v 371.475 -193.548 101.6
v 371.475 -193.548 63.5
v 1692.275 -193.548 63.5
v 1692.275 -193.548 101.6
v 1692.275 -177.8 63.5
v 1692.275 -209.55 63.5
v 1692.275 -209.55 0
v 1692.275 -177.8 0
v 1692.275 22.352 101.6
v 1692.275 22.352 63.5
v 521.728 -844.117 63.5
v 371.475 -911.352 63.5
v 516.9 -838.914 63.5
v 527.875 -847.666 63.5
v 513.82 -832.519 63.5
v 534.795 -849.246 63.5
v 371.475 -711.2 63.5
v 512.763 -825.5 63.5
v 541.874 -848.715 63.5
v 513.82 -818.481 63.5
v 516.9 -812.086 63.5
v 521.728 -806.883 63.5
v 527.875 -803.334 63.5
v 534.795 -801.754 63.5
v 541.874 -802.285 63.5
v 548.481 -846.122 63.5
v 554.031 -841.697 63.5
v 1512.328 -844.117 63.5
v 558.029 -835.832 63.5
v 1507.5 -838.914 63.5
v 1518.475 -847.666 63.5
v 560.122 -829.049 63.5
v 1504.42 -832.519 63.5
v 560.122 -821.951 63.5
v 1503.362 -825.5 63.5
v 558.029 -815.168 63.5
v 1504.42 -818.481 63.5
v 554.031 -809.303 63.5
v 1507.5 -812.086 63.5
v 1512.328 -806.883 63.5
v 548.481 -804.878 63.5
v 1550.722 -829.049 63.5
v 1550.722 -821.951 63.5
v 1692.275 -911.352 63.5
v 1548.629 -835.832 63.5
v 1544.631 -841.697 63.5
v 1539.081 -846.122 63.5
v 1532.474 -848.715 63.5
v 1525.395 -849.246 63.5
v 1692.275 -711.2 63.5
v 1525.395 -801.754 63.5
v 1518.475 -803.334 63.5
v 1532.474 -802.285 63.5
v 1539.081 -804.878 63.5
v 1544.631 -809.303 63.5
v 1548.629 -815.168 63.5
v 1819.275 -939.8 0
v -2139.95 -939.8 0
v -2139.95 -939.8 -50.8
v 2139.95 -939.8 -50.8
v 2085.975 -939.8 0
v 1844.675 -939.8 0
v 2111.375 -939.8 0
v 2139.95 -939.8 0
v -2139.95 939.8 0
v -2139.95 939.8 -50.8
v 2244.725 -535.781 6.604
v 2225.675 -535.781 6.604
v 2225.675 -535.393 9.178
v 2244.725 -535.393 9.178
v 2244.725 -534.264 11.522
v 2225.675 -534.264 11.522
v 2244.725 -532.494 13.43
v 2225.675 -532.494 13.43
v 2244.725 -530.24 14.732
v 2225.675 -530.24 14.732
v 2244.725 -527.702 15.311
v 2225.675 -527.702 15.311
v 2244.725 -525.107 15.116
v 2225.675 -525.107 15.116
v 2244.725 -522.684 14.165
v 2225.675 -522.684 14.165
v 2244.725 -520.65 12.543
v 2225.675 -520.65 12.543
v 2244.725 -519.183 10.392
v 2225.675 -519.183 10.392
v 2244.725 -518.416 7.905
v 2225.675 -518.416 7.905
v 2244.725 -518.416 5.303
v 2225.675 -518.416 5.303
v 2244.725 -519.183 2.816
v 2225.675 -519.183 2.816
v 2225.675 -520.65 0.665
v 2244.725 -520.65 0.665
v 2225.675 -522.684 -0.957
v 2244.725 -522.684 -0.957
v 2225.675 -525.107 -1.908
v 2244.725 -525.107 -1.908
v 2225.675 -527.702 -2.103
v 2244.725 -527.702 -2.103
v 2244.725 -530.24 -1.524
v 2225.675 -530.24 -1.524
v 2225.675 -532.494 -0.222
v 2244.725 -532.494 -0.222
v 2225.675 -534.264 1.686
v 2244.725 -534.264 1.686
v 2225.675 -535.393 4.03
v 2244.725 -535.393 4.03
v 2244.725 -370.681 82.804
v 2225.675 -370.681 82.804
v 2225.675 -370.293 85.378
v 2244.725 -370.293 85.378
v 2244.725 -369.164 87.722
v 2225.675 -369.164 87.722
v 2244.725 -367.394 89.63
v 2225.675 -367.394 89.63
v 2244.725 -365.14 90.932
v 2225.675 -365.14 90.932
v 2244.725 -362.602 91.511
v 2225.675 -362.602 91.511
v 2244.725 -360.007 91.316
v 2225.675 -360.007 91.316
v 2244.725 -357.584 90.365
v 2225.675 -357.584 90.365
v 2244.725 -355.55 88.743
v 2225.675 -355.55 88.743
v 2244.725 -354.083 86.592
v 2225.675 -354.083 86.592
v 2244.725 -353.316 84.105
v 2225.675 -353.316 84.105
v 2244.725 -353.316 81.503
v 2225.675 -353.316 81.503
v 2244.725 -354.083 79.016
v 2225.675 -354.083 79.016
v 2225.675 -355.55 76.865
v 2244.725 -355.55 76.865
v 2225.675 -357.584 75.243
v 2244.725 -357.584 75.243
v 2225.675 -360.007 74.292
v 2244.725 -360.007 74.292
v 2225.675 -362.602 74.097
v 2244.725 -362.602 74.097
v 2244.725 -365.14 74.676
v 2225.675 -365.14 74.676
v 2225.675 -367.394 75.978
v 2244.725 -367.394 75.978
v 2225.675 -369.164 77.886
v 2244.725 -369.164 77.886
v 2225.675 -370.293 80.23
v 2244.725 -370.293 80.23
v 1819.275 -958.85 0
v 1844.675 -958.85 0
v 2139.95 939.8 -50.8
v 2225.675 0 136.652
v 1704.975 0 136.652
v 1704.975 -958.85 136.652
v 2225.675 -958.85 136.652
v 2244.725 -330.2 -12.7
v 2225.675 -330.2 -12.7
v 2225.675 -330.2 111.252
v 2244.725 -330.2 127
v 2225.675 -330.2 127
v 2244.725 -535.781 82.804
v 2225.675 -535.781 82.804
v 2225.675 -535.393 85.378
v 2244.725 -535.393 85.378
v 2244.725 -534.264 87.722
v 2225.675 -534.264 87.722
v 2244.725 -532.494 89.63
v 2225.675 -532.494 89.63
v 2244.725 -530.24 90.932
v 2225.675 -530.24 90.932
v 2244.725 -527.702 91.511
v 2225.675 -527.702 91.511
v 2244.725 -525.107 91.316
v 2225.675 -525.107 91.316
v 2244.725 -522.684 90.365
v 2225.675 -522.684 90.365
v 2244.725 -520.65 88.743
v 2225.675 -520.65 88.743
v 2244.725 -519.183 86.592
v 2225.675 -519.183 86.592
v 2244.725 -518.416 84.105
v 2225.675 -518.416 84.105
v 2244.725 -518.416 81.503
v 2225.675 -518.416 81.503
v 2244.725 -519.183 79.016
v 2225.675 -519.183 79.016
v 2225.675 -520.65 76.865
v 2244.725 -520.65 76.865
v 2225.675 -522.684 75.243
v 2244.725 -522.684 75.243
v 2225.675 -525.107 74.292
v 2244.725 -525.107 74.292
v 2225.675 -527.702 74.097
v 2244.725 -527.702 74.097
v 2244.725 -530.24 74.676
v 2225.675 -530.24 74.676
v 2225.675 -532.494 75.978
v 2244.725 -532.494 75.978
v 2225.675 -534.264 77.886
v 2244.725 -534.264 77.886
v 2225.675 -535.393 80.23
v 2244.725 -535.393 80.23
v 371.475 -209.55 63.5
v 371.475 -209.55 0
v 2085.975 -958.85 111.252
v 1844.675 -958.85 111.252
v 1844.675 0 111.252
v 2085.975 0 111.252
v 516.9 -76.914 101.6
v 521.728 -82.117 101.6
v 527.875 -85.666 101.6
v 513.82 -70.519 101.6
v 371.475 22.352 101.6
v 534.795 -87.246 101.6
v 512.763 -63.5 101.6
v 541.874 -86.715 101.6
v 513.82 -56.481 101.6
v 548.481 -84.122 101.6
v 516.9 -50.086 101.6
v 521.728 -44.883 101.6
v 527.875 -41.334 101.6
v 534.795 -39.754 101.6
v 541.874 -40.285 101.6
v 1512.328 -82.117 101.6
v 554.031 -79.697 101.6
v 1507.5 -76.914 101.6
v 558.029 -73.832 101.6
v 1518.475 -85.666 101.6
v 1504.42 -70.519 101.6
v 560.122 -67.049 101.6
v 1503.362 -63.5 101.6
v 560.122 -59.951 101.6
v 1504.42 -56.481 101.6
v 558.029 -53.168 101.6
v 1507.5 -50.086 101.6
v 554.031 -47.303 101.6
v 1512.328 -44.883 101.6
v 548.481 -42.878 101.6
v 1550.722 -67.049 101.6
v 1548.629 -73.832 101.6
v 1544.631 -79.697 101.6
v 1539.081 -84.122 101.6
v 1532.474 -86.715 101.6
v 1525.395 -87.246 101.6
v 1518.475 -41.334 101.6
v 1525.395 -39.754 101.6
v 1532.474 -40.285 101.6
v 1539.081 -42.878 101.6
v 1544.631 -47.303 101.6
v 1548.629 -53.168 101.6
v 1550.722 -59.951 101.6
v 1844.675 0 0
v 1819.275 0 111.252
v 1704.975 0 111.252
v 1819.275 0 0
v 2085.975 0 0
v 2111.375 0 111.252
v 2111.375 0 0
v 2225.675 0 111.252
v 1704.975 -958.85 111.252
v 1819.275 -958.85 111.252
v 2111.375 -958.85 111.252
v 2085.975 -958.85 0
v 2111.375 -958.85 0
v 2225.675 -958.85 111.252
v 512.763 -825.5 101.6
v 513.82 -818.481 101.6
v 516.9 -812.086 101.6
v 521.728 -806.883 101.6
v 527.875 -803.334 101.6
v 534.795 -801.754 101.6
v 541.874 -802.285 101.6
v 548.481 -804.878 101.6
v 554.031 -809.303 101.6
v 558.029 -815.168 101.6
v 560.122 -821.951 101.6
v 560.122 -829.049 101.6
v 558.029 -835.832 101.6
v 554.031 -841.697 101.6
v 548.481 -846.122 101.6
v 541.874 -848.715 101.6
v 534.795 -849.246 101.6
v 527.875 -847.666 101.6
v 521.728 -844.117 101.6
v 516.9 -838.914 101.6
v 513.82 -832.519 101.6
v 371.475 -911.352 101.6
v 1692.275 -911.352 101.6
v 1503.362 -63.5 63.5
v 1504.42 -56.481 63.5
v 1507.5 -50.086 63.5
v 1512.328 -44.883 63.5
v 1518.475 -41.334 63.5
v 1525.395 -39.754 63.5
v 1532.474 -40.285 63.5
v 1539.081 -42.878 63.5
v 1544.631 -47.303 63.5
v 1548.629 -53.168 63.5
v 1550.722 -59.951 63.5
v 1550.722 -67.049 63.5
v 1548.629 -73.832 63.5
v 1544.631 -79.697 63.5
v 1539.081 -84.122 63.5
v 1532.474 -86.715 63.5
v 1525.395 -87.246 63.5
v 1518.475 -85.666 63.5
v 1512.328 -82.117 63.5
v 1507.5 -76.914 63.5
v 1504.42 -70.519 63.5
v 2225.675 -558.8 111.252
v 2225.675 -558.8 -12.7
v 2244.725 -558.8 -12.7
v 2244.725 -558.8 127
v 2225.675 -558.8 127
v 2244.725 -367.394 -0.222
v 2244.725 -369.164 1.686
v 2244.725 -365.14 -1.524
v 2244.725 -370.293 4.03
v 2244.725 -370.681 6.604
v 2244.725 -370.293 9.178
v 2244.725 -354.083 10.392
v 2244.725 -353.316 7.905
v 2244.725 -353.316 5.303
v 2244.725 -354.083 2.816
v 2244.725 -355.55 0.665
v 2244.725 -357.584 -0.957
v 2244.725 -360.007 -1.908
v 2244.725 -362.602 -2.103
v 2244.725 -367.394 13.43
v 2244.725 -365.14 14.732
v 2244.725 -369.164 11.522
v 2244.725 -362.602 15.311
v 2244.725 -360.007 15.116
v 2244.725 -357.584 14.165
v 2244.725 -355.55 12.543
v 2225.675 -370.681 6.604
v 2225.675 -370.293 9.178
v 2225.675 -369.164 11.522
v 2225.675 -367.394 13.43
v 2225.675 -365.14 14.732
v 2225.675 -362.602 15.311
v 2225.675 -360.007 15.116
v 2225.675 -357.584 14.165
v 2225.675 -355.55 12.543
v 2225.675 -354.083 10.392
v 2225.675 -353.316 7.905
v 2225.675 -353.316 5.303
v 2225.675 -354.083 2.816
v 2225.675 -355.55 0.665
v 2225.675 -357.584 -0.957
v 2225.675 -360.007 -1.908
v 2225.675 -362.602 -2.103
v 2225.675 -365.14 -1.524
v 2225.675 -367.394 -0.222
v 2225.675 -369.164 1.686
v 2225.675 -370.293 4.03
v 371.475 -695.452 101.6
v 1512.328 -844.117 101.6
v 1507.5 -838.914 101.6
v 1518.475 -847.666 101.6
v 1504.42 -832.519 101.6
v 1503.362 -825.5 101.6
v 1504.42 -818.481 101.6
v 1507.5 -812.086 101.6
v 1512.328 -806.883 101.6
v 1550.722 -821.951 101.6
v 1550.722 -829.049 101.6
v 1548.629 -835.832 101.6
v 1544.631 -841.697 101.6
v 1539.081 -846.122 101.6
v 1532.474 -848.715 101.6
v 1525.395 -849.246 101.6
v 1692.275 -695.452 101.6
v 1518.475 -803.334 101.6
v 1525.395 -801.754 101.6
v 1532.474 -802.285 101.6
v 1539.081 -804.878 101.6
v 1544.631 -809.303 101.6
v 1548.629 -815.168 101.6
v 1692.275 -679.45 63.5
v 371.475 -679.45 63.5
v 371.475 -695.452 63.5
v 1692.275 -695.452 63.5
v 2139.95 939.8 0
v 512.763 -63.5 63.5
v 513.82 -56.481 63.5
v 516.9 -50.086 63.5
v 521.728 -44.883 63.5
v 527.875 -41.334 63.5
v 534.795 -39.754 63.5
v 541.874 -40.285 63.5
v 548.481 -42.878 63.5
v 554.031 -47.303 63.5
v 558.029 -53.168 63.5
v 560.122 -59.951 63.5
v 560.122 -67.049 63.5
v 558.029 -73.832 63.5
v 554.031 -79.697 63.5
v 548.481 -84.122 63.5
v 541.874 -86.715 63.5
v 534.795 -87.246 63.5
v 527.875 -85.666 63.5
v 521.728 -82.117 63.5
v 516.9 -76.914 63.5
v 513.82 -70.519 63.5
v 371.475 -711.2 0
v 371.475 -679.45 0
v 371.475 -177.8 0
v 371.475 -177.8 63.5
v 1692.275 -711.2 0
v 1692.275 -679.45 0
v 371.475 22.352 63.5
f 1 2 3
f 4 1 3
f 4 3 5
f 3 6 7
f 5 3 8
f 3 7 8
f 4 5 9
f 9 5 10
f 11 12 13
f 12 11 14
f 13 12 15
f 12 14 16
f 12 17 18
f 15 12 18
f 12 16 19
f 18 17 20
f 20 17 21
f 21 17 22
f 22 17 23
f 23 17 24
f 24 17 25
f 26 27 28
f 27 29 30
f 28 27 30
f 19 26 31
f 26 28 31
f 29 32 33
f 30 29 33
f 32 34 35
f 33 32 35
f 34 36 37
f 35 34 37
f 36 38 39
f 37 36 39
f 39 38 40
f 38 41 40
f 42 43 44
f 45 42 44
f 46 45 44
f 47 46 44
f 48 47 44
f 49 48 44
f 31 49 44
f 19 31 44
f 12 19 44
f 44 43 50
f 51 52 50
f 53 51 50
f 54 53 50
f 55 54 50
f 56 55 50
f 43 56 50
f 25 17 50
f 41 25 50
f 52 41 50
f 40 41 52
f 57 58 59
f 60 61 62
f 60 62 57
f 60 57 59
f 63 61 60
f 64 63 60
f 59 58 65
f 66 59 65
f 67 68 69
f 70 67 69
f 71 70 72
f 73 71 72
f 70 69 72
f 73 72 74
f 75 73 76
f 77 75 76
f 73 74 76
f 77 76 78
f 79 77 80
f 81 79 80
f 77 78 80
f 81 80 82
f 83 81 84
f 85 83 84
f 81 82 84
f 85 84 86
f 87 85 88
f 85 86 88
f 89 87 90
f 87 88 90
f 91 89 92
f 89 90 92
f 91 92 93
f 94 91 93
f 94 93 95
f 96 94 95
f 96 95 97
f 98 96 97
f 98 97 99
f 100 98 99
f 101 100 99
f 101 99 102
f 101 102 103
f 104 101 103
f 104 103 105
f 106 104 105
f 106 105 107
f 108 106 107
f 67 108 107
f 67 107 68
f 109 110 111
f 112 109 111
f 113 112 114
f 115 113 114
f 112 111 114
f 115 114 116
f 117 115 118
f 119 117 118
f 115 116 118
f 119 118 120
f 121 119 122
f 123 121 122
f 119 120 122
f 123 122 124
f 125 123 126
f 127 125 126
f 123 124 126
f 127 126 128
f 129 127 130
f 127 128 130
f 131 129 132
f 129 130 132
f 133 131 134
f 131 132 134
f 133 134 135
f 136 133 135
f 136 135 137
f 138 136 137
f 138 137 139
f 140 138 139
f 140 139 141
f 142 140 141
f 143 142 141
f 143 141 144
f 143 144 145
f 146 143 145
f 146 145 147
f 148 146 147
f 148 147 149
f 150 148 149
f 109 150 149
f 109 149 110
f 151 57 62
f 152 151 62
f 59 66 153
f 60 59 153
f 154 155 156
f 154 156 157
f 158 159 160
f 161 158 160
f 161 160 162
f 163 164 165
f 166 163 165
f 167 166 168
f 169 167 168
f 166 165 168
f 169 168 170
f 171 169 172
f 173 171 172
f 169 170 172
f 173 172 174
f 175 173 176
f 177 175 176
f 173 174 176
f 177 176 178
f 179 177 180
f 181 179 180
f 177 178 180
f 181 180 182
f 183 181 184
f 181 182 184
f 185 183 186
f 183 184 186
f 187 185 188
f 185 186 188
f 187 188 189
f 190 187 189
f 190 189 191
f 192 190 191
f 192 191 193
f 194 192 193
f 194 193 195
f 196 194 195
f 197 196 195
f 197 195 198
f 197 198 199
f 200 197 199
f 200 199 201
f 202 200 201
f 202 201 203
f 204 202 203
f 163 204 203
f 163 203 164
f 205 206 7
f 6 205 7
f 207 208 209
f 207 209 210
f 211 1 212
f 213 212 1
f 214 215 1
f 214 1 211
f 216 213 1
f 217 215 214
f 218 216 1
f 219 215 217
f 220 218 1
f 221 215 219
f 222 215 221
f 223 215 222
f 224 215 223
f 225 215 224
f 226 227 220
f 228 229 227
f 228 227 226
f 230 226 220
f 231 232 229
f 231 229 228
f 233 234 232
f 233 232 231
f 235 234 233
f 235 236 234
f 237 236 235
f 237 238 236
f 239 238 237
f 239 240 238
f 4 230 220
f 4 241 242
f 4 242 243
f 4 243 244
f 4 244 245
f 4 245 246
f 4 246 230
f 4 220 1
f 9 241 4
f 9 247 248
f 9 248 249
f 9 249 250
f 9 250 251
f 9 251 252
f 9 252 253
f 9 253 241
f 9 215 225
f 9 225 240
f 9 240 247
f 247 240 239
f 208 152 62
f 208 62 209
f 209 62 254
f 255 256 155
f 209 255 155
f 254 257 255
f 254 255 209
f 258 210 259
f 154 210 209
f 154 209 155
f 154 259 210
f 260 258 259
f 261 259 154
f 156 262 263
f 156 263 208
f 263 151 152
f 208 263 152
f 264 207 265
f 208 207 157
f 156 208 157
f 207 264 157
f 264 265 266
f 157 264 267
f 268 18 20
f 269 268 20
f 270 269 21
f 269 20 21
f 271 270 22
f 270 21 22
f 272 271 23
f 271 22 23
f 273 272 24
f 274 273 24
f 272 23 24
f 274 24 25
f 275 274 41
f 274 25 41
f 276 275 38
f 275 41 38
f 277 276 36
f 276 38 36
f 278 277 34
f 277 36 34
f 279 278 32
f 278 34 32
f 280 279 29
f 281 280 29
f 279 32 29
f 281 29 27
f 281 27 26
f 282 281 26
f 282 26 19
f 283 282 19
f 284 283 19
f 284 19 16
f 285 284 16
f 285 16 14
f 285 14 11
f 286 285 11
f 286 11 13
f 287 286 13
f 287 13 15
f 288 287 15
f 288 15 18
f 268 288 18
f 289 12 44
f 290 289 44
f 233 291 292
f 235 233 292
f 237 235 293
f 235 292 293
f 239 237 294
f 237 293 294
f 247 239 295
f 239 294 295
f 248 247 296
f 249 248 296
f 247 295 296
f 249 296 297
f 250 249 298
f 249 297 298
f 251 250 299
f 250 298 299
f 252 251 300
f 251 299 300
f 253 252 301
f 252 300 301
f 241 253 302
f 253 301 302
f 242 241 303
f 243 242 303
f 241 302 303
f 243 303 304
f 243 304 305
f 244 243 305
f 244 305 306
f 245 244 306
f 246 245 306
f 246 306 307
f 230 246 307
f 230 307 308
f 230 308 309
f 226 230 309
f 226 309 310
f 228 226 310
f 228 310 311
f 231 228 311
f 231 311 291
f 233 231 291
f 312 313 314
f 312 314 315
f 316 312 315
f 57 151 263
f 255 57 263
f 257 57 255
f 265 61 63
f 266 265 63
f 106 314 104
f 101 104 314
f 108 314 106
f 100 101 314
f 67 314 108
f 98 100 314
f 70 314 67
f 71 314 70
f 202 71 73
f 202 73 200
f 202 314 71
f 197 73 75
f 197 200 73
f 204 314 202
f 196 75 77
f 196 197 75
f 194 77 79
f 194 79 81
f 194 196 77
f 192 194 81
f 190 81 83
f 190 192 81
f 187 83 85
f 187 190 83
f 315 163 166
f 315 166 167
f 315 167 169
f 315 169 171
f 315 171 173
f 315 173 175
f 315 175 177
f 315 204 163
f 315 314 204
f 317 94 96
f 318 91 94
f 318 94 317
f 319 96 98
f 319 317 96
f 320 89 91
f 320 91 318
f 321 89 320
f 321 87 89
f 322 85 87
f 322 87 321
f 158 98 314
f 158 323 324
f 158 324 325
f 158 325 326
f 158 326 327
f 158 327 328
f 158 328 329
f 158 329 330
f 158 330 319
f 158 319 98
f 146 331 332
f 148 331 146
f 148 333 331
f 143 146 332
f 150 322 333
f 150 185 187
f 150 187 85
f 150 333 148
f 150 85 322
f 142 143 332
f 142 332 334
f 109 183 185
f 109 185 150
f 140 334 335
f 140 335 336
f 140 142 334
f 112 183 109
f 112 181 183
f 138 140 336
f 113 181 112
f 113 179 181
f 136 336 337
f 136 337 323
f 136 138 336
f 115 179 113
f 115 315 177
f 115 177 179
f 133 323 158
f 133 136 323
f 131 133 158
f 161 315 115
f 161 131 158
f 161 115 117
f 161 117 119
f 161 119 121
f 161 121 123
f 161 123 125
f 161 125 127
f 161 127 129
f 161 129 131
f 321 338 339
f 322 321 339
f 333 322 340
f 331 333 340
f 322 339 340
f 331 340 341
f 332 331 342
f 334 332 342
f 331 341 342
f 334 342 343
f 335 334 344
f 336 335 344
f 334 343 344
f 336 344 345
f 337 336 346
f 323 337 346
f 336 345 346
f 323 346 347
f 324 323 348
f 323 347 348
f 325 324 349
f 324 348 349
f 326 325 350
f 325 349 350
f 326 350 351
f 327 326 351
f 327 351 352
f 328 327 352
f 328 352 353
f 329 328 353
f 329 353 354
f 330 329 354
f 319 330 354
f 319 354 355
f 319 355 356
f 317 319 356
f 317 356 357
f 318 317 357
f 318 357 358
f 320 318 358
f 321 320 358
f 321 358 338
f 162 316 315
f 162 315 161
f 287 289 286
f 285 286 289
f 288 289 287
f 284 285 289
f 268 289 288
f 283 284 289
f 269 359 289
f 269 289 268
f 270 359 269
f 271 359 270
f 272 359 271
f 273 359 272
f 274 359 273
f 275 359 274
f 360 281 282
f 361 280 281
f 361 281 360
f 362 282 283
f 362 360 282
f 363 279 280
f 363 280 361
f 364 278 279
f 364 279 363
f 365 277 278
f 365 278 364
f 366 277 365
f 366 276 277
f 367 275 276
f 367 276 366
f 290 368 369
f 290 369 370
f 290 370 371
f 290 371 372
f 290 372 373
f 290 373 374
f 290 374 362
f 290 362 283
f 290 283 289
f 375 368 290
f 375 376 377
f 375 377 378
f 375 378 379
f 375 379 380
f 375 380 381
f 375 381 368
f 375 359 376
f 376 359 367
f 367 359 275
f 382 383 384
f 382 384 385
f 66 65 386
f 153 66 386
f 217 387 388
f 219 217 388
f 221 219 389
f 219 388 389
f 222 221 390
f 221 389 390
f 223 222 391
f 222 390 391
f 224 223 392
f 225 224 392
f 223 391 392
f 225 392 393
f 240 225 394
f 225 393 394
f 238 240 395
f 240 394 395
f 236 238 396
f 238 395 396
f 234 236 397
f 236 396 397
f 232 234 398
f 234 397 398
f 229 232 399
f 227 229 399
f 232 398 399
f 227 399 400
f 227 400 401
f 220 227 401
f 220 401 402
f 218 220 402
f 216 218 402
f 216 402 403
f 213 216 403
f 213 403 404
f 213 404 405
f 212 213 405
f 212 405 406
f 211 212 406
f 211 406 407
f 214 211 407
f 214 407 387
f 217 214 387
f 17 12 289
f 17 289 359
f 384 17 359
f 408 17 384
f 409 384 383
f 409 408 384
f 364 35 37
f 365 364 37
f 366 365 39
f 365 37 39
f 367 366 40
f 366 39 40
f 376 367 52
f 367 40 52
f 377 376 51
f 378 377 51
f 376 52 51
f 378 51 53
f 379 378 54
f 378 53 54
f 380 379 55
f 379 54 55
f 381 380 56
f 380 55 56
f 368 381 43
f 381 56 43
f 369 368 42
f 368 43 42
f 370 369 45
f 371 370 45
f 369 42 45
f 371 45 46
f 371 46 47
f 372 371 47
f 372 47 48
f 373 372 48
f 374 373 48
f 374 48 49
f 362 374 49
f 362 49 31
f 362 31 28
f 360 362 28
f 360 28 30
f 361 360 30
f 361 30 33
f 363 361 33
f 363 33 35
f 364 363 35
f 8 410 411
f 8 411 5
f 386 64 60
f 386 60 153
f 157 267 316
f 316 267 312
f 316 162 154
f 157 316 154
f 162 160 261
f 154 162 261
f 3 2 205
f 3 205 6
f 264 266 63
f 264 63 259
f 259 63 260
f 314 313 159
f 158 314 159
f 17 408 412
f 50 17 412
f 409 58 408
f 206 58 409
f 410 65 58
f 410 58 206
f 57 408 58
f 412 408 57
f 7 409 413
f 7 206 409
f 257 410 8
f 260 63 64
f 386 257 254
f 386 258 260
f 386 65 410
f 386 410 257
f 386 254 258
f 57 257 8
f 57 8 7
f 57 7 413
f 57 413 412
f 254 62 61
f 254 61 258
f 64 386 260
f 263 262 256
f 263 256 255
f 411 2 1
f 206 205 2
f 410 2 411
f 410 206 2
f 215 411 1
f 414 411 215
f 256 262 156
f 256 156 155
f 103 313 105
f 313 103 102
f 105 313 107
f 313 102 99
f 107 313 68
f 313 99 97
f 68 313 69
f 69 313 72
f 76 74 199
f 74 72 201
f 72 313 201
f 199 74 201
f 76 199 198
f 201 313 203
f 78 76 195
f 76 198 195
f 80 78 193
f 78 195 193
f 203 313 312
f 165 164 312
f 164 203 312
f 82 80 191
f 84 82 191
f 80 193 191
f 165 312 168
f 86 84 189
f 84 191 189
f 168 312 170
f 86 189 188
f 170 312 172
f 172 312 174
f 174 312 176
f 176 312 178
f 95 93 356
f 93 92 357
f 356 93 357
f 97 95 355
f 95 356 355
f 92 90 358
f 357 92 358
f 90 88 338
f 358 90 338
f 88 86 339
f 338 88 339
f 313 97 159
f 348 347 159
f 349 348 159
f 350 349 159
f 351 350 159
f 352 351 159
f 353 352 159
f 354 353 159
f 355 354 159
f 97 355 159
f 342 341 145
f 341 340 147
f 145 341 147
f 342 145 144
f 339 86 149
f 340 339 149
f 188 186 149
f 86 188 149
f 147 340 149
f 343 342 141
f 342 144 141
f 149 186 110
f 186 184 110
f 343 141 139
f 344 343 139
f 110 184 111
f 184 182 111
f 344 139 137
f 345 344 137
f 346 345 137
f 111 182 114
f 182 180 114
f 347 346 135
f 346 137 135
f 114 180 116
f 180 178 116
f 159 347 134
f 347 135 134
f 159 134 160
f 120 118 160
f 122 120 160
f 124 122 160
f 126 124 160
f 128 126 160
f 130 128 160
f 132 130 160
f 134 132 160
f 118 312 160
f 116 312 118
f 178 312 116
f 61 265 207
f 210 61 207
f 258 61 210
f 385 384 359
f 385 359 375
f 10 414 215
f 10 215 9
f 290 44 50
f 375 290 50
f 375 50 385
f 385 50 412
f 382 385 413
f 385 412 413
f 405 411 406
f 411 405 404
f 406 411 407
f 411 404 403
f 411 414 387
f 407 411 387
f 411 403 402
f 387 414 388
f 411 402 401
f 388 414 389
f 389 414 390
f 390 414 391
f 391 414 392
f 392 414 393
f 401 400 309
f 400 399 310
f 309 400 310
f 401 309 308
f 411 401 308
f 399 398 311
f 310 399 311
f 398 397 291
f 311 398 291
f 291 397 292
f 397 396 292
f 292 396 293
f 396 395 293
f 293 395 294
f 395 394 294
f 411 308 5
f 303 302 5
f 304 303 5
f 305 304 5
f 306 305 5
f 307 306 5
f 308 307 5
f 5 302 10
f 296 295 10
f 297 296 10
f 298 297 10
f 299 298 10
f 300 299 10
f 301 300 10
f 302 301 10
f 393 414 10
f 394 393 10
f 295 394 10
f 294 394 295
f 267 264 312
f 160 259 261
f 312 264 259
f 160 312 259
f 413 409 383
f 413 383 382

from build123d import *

# Parameters (mm, degrees)
F0_W      = 4279.9
F0_H      = 1879.6
F1_DEPTH  = 50.8
F2_W      = 1320.8
F2_H      = 31.75
F3_DEPTH  = 63.5
F4_W      = 1320.8
F4_H      = 215.9
F5_DEPTH  = 38.1
F7_D      = 47.625
F7_DEPTH  = 50.8
F7_TIP    = 14.3079934906
F8_W      = 25.4
F8_H      = 958.85
F9_DEPTH  = 111.252
F10_W     = 520.7
F10_H     = 958.85
F11_DEPTH = 25.4
F12_W     = 228.6
F12_H     = 139.7
F13_DEPTH = 19.05
F15_D     = 17.4625
F15_DEPTH = 50.8
F15_TIP   = 5.2462642799


# Not quite as in the source:
# - a length typed as a fraction of an inch, garbled in the dataset ("3 / 203.2 mm" for 3/8 in), is restored


with BuildPart() as f1:
    # F0 (on Top) → F1 (new body)
    with BuildSketch(Plane.XY):
        Rectangle(F0_W, F0_H)
    extrude(amount=-F1_DEPTH)

    # F2 (on face) → F3 (join)
    with BuildSketch(Plane.XY):
        with Locations((1031.875, -695.325)):
            Rectangle(F2_W, F2_H)
        with Locations((1031.875, -193.675)):
            Rectangle(F2_W, F2_H)
    extrude(amount=F3_DEPTH)

    # F4 (on face) → F5 (join)
    with BuildSketch(Plane.XY.offset(63.5)):
        with Locations((1031.875, -803.402)):
            Rectangle(F4_W, F4_H)
        with Locations((1031.875, -85.598)):
            Rectangle(F4_W, F4_H)
    extrude(amount=F5_DEPTH)

    # F7
    with Locations(Plane.XY.offset(101.6)):
        with Locations((536.575, -63.5), (1527.175, -63.5), (536.575, -825.5), (1527.175, -825.5)):
            Hole(F7_D / 2, depth=F7_DEPTH)
            with Locations((0, 0, -(F7_DEPTH + F7_TIP / 2))):  # 118° drill point
                Cone(0, F7_D / 2, F7_TIP, mode=Mode.SUBTRACT)

    # F8 (on face) → F9 (join)
    with BuildSketch(Plane.XY):
        with Locations((1831.975, -479.425)):
            Rectangle(F8_W, F8_H)
        with Locations((2098.675, -479.425)):
            Rectangle(F8_W, F8_H)
    extrude(amount=F9_DEPTH)

    # F10 (on face) → F11 (join)
    with BuildSketch(Plane.XY.offset(111.252)):
        with Locations((1965.325, -479.425)):
            Rectangle(F10_W, F10_H)
    extrude(amount=F11_DEPTH)

    # F12 (on face) → F13 (join)
    with BuildSketch(Plane.YZ.offset(2225.675)):
        with Locations((-444.5, 57.15)):
            Rectangle(F12_W, F12_H)
    extrude(amount=F13_DEPTH)

    # F15
    with Locations(Plane.YZ.offset(2244.725)):
        with Locations((-527.05, 82.804), (-527.05, 6.604), (-361.95, 6.604), (-361.95, 82.804)):
            Hole(F15_D / 2, depth=F15_DEPTH)
            with Locations((0, 0, -(F15_DEPTH + F15_TIP / 2))):  # 118° drill point
                Cone(0, F15_D / 2, F15_TIP, mode=Mode.SUBTRACT)


solid = f1.part
